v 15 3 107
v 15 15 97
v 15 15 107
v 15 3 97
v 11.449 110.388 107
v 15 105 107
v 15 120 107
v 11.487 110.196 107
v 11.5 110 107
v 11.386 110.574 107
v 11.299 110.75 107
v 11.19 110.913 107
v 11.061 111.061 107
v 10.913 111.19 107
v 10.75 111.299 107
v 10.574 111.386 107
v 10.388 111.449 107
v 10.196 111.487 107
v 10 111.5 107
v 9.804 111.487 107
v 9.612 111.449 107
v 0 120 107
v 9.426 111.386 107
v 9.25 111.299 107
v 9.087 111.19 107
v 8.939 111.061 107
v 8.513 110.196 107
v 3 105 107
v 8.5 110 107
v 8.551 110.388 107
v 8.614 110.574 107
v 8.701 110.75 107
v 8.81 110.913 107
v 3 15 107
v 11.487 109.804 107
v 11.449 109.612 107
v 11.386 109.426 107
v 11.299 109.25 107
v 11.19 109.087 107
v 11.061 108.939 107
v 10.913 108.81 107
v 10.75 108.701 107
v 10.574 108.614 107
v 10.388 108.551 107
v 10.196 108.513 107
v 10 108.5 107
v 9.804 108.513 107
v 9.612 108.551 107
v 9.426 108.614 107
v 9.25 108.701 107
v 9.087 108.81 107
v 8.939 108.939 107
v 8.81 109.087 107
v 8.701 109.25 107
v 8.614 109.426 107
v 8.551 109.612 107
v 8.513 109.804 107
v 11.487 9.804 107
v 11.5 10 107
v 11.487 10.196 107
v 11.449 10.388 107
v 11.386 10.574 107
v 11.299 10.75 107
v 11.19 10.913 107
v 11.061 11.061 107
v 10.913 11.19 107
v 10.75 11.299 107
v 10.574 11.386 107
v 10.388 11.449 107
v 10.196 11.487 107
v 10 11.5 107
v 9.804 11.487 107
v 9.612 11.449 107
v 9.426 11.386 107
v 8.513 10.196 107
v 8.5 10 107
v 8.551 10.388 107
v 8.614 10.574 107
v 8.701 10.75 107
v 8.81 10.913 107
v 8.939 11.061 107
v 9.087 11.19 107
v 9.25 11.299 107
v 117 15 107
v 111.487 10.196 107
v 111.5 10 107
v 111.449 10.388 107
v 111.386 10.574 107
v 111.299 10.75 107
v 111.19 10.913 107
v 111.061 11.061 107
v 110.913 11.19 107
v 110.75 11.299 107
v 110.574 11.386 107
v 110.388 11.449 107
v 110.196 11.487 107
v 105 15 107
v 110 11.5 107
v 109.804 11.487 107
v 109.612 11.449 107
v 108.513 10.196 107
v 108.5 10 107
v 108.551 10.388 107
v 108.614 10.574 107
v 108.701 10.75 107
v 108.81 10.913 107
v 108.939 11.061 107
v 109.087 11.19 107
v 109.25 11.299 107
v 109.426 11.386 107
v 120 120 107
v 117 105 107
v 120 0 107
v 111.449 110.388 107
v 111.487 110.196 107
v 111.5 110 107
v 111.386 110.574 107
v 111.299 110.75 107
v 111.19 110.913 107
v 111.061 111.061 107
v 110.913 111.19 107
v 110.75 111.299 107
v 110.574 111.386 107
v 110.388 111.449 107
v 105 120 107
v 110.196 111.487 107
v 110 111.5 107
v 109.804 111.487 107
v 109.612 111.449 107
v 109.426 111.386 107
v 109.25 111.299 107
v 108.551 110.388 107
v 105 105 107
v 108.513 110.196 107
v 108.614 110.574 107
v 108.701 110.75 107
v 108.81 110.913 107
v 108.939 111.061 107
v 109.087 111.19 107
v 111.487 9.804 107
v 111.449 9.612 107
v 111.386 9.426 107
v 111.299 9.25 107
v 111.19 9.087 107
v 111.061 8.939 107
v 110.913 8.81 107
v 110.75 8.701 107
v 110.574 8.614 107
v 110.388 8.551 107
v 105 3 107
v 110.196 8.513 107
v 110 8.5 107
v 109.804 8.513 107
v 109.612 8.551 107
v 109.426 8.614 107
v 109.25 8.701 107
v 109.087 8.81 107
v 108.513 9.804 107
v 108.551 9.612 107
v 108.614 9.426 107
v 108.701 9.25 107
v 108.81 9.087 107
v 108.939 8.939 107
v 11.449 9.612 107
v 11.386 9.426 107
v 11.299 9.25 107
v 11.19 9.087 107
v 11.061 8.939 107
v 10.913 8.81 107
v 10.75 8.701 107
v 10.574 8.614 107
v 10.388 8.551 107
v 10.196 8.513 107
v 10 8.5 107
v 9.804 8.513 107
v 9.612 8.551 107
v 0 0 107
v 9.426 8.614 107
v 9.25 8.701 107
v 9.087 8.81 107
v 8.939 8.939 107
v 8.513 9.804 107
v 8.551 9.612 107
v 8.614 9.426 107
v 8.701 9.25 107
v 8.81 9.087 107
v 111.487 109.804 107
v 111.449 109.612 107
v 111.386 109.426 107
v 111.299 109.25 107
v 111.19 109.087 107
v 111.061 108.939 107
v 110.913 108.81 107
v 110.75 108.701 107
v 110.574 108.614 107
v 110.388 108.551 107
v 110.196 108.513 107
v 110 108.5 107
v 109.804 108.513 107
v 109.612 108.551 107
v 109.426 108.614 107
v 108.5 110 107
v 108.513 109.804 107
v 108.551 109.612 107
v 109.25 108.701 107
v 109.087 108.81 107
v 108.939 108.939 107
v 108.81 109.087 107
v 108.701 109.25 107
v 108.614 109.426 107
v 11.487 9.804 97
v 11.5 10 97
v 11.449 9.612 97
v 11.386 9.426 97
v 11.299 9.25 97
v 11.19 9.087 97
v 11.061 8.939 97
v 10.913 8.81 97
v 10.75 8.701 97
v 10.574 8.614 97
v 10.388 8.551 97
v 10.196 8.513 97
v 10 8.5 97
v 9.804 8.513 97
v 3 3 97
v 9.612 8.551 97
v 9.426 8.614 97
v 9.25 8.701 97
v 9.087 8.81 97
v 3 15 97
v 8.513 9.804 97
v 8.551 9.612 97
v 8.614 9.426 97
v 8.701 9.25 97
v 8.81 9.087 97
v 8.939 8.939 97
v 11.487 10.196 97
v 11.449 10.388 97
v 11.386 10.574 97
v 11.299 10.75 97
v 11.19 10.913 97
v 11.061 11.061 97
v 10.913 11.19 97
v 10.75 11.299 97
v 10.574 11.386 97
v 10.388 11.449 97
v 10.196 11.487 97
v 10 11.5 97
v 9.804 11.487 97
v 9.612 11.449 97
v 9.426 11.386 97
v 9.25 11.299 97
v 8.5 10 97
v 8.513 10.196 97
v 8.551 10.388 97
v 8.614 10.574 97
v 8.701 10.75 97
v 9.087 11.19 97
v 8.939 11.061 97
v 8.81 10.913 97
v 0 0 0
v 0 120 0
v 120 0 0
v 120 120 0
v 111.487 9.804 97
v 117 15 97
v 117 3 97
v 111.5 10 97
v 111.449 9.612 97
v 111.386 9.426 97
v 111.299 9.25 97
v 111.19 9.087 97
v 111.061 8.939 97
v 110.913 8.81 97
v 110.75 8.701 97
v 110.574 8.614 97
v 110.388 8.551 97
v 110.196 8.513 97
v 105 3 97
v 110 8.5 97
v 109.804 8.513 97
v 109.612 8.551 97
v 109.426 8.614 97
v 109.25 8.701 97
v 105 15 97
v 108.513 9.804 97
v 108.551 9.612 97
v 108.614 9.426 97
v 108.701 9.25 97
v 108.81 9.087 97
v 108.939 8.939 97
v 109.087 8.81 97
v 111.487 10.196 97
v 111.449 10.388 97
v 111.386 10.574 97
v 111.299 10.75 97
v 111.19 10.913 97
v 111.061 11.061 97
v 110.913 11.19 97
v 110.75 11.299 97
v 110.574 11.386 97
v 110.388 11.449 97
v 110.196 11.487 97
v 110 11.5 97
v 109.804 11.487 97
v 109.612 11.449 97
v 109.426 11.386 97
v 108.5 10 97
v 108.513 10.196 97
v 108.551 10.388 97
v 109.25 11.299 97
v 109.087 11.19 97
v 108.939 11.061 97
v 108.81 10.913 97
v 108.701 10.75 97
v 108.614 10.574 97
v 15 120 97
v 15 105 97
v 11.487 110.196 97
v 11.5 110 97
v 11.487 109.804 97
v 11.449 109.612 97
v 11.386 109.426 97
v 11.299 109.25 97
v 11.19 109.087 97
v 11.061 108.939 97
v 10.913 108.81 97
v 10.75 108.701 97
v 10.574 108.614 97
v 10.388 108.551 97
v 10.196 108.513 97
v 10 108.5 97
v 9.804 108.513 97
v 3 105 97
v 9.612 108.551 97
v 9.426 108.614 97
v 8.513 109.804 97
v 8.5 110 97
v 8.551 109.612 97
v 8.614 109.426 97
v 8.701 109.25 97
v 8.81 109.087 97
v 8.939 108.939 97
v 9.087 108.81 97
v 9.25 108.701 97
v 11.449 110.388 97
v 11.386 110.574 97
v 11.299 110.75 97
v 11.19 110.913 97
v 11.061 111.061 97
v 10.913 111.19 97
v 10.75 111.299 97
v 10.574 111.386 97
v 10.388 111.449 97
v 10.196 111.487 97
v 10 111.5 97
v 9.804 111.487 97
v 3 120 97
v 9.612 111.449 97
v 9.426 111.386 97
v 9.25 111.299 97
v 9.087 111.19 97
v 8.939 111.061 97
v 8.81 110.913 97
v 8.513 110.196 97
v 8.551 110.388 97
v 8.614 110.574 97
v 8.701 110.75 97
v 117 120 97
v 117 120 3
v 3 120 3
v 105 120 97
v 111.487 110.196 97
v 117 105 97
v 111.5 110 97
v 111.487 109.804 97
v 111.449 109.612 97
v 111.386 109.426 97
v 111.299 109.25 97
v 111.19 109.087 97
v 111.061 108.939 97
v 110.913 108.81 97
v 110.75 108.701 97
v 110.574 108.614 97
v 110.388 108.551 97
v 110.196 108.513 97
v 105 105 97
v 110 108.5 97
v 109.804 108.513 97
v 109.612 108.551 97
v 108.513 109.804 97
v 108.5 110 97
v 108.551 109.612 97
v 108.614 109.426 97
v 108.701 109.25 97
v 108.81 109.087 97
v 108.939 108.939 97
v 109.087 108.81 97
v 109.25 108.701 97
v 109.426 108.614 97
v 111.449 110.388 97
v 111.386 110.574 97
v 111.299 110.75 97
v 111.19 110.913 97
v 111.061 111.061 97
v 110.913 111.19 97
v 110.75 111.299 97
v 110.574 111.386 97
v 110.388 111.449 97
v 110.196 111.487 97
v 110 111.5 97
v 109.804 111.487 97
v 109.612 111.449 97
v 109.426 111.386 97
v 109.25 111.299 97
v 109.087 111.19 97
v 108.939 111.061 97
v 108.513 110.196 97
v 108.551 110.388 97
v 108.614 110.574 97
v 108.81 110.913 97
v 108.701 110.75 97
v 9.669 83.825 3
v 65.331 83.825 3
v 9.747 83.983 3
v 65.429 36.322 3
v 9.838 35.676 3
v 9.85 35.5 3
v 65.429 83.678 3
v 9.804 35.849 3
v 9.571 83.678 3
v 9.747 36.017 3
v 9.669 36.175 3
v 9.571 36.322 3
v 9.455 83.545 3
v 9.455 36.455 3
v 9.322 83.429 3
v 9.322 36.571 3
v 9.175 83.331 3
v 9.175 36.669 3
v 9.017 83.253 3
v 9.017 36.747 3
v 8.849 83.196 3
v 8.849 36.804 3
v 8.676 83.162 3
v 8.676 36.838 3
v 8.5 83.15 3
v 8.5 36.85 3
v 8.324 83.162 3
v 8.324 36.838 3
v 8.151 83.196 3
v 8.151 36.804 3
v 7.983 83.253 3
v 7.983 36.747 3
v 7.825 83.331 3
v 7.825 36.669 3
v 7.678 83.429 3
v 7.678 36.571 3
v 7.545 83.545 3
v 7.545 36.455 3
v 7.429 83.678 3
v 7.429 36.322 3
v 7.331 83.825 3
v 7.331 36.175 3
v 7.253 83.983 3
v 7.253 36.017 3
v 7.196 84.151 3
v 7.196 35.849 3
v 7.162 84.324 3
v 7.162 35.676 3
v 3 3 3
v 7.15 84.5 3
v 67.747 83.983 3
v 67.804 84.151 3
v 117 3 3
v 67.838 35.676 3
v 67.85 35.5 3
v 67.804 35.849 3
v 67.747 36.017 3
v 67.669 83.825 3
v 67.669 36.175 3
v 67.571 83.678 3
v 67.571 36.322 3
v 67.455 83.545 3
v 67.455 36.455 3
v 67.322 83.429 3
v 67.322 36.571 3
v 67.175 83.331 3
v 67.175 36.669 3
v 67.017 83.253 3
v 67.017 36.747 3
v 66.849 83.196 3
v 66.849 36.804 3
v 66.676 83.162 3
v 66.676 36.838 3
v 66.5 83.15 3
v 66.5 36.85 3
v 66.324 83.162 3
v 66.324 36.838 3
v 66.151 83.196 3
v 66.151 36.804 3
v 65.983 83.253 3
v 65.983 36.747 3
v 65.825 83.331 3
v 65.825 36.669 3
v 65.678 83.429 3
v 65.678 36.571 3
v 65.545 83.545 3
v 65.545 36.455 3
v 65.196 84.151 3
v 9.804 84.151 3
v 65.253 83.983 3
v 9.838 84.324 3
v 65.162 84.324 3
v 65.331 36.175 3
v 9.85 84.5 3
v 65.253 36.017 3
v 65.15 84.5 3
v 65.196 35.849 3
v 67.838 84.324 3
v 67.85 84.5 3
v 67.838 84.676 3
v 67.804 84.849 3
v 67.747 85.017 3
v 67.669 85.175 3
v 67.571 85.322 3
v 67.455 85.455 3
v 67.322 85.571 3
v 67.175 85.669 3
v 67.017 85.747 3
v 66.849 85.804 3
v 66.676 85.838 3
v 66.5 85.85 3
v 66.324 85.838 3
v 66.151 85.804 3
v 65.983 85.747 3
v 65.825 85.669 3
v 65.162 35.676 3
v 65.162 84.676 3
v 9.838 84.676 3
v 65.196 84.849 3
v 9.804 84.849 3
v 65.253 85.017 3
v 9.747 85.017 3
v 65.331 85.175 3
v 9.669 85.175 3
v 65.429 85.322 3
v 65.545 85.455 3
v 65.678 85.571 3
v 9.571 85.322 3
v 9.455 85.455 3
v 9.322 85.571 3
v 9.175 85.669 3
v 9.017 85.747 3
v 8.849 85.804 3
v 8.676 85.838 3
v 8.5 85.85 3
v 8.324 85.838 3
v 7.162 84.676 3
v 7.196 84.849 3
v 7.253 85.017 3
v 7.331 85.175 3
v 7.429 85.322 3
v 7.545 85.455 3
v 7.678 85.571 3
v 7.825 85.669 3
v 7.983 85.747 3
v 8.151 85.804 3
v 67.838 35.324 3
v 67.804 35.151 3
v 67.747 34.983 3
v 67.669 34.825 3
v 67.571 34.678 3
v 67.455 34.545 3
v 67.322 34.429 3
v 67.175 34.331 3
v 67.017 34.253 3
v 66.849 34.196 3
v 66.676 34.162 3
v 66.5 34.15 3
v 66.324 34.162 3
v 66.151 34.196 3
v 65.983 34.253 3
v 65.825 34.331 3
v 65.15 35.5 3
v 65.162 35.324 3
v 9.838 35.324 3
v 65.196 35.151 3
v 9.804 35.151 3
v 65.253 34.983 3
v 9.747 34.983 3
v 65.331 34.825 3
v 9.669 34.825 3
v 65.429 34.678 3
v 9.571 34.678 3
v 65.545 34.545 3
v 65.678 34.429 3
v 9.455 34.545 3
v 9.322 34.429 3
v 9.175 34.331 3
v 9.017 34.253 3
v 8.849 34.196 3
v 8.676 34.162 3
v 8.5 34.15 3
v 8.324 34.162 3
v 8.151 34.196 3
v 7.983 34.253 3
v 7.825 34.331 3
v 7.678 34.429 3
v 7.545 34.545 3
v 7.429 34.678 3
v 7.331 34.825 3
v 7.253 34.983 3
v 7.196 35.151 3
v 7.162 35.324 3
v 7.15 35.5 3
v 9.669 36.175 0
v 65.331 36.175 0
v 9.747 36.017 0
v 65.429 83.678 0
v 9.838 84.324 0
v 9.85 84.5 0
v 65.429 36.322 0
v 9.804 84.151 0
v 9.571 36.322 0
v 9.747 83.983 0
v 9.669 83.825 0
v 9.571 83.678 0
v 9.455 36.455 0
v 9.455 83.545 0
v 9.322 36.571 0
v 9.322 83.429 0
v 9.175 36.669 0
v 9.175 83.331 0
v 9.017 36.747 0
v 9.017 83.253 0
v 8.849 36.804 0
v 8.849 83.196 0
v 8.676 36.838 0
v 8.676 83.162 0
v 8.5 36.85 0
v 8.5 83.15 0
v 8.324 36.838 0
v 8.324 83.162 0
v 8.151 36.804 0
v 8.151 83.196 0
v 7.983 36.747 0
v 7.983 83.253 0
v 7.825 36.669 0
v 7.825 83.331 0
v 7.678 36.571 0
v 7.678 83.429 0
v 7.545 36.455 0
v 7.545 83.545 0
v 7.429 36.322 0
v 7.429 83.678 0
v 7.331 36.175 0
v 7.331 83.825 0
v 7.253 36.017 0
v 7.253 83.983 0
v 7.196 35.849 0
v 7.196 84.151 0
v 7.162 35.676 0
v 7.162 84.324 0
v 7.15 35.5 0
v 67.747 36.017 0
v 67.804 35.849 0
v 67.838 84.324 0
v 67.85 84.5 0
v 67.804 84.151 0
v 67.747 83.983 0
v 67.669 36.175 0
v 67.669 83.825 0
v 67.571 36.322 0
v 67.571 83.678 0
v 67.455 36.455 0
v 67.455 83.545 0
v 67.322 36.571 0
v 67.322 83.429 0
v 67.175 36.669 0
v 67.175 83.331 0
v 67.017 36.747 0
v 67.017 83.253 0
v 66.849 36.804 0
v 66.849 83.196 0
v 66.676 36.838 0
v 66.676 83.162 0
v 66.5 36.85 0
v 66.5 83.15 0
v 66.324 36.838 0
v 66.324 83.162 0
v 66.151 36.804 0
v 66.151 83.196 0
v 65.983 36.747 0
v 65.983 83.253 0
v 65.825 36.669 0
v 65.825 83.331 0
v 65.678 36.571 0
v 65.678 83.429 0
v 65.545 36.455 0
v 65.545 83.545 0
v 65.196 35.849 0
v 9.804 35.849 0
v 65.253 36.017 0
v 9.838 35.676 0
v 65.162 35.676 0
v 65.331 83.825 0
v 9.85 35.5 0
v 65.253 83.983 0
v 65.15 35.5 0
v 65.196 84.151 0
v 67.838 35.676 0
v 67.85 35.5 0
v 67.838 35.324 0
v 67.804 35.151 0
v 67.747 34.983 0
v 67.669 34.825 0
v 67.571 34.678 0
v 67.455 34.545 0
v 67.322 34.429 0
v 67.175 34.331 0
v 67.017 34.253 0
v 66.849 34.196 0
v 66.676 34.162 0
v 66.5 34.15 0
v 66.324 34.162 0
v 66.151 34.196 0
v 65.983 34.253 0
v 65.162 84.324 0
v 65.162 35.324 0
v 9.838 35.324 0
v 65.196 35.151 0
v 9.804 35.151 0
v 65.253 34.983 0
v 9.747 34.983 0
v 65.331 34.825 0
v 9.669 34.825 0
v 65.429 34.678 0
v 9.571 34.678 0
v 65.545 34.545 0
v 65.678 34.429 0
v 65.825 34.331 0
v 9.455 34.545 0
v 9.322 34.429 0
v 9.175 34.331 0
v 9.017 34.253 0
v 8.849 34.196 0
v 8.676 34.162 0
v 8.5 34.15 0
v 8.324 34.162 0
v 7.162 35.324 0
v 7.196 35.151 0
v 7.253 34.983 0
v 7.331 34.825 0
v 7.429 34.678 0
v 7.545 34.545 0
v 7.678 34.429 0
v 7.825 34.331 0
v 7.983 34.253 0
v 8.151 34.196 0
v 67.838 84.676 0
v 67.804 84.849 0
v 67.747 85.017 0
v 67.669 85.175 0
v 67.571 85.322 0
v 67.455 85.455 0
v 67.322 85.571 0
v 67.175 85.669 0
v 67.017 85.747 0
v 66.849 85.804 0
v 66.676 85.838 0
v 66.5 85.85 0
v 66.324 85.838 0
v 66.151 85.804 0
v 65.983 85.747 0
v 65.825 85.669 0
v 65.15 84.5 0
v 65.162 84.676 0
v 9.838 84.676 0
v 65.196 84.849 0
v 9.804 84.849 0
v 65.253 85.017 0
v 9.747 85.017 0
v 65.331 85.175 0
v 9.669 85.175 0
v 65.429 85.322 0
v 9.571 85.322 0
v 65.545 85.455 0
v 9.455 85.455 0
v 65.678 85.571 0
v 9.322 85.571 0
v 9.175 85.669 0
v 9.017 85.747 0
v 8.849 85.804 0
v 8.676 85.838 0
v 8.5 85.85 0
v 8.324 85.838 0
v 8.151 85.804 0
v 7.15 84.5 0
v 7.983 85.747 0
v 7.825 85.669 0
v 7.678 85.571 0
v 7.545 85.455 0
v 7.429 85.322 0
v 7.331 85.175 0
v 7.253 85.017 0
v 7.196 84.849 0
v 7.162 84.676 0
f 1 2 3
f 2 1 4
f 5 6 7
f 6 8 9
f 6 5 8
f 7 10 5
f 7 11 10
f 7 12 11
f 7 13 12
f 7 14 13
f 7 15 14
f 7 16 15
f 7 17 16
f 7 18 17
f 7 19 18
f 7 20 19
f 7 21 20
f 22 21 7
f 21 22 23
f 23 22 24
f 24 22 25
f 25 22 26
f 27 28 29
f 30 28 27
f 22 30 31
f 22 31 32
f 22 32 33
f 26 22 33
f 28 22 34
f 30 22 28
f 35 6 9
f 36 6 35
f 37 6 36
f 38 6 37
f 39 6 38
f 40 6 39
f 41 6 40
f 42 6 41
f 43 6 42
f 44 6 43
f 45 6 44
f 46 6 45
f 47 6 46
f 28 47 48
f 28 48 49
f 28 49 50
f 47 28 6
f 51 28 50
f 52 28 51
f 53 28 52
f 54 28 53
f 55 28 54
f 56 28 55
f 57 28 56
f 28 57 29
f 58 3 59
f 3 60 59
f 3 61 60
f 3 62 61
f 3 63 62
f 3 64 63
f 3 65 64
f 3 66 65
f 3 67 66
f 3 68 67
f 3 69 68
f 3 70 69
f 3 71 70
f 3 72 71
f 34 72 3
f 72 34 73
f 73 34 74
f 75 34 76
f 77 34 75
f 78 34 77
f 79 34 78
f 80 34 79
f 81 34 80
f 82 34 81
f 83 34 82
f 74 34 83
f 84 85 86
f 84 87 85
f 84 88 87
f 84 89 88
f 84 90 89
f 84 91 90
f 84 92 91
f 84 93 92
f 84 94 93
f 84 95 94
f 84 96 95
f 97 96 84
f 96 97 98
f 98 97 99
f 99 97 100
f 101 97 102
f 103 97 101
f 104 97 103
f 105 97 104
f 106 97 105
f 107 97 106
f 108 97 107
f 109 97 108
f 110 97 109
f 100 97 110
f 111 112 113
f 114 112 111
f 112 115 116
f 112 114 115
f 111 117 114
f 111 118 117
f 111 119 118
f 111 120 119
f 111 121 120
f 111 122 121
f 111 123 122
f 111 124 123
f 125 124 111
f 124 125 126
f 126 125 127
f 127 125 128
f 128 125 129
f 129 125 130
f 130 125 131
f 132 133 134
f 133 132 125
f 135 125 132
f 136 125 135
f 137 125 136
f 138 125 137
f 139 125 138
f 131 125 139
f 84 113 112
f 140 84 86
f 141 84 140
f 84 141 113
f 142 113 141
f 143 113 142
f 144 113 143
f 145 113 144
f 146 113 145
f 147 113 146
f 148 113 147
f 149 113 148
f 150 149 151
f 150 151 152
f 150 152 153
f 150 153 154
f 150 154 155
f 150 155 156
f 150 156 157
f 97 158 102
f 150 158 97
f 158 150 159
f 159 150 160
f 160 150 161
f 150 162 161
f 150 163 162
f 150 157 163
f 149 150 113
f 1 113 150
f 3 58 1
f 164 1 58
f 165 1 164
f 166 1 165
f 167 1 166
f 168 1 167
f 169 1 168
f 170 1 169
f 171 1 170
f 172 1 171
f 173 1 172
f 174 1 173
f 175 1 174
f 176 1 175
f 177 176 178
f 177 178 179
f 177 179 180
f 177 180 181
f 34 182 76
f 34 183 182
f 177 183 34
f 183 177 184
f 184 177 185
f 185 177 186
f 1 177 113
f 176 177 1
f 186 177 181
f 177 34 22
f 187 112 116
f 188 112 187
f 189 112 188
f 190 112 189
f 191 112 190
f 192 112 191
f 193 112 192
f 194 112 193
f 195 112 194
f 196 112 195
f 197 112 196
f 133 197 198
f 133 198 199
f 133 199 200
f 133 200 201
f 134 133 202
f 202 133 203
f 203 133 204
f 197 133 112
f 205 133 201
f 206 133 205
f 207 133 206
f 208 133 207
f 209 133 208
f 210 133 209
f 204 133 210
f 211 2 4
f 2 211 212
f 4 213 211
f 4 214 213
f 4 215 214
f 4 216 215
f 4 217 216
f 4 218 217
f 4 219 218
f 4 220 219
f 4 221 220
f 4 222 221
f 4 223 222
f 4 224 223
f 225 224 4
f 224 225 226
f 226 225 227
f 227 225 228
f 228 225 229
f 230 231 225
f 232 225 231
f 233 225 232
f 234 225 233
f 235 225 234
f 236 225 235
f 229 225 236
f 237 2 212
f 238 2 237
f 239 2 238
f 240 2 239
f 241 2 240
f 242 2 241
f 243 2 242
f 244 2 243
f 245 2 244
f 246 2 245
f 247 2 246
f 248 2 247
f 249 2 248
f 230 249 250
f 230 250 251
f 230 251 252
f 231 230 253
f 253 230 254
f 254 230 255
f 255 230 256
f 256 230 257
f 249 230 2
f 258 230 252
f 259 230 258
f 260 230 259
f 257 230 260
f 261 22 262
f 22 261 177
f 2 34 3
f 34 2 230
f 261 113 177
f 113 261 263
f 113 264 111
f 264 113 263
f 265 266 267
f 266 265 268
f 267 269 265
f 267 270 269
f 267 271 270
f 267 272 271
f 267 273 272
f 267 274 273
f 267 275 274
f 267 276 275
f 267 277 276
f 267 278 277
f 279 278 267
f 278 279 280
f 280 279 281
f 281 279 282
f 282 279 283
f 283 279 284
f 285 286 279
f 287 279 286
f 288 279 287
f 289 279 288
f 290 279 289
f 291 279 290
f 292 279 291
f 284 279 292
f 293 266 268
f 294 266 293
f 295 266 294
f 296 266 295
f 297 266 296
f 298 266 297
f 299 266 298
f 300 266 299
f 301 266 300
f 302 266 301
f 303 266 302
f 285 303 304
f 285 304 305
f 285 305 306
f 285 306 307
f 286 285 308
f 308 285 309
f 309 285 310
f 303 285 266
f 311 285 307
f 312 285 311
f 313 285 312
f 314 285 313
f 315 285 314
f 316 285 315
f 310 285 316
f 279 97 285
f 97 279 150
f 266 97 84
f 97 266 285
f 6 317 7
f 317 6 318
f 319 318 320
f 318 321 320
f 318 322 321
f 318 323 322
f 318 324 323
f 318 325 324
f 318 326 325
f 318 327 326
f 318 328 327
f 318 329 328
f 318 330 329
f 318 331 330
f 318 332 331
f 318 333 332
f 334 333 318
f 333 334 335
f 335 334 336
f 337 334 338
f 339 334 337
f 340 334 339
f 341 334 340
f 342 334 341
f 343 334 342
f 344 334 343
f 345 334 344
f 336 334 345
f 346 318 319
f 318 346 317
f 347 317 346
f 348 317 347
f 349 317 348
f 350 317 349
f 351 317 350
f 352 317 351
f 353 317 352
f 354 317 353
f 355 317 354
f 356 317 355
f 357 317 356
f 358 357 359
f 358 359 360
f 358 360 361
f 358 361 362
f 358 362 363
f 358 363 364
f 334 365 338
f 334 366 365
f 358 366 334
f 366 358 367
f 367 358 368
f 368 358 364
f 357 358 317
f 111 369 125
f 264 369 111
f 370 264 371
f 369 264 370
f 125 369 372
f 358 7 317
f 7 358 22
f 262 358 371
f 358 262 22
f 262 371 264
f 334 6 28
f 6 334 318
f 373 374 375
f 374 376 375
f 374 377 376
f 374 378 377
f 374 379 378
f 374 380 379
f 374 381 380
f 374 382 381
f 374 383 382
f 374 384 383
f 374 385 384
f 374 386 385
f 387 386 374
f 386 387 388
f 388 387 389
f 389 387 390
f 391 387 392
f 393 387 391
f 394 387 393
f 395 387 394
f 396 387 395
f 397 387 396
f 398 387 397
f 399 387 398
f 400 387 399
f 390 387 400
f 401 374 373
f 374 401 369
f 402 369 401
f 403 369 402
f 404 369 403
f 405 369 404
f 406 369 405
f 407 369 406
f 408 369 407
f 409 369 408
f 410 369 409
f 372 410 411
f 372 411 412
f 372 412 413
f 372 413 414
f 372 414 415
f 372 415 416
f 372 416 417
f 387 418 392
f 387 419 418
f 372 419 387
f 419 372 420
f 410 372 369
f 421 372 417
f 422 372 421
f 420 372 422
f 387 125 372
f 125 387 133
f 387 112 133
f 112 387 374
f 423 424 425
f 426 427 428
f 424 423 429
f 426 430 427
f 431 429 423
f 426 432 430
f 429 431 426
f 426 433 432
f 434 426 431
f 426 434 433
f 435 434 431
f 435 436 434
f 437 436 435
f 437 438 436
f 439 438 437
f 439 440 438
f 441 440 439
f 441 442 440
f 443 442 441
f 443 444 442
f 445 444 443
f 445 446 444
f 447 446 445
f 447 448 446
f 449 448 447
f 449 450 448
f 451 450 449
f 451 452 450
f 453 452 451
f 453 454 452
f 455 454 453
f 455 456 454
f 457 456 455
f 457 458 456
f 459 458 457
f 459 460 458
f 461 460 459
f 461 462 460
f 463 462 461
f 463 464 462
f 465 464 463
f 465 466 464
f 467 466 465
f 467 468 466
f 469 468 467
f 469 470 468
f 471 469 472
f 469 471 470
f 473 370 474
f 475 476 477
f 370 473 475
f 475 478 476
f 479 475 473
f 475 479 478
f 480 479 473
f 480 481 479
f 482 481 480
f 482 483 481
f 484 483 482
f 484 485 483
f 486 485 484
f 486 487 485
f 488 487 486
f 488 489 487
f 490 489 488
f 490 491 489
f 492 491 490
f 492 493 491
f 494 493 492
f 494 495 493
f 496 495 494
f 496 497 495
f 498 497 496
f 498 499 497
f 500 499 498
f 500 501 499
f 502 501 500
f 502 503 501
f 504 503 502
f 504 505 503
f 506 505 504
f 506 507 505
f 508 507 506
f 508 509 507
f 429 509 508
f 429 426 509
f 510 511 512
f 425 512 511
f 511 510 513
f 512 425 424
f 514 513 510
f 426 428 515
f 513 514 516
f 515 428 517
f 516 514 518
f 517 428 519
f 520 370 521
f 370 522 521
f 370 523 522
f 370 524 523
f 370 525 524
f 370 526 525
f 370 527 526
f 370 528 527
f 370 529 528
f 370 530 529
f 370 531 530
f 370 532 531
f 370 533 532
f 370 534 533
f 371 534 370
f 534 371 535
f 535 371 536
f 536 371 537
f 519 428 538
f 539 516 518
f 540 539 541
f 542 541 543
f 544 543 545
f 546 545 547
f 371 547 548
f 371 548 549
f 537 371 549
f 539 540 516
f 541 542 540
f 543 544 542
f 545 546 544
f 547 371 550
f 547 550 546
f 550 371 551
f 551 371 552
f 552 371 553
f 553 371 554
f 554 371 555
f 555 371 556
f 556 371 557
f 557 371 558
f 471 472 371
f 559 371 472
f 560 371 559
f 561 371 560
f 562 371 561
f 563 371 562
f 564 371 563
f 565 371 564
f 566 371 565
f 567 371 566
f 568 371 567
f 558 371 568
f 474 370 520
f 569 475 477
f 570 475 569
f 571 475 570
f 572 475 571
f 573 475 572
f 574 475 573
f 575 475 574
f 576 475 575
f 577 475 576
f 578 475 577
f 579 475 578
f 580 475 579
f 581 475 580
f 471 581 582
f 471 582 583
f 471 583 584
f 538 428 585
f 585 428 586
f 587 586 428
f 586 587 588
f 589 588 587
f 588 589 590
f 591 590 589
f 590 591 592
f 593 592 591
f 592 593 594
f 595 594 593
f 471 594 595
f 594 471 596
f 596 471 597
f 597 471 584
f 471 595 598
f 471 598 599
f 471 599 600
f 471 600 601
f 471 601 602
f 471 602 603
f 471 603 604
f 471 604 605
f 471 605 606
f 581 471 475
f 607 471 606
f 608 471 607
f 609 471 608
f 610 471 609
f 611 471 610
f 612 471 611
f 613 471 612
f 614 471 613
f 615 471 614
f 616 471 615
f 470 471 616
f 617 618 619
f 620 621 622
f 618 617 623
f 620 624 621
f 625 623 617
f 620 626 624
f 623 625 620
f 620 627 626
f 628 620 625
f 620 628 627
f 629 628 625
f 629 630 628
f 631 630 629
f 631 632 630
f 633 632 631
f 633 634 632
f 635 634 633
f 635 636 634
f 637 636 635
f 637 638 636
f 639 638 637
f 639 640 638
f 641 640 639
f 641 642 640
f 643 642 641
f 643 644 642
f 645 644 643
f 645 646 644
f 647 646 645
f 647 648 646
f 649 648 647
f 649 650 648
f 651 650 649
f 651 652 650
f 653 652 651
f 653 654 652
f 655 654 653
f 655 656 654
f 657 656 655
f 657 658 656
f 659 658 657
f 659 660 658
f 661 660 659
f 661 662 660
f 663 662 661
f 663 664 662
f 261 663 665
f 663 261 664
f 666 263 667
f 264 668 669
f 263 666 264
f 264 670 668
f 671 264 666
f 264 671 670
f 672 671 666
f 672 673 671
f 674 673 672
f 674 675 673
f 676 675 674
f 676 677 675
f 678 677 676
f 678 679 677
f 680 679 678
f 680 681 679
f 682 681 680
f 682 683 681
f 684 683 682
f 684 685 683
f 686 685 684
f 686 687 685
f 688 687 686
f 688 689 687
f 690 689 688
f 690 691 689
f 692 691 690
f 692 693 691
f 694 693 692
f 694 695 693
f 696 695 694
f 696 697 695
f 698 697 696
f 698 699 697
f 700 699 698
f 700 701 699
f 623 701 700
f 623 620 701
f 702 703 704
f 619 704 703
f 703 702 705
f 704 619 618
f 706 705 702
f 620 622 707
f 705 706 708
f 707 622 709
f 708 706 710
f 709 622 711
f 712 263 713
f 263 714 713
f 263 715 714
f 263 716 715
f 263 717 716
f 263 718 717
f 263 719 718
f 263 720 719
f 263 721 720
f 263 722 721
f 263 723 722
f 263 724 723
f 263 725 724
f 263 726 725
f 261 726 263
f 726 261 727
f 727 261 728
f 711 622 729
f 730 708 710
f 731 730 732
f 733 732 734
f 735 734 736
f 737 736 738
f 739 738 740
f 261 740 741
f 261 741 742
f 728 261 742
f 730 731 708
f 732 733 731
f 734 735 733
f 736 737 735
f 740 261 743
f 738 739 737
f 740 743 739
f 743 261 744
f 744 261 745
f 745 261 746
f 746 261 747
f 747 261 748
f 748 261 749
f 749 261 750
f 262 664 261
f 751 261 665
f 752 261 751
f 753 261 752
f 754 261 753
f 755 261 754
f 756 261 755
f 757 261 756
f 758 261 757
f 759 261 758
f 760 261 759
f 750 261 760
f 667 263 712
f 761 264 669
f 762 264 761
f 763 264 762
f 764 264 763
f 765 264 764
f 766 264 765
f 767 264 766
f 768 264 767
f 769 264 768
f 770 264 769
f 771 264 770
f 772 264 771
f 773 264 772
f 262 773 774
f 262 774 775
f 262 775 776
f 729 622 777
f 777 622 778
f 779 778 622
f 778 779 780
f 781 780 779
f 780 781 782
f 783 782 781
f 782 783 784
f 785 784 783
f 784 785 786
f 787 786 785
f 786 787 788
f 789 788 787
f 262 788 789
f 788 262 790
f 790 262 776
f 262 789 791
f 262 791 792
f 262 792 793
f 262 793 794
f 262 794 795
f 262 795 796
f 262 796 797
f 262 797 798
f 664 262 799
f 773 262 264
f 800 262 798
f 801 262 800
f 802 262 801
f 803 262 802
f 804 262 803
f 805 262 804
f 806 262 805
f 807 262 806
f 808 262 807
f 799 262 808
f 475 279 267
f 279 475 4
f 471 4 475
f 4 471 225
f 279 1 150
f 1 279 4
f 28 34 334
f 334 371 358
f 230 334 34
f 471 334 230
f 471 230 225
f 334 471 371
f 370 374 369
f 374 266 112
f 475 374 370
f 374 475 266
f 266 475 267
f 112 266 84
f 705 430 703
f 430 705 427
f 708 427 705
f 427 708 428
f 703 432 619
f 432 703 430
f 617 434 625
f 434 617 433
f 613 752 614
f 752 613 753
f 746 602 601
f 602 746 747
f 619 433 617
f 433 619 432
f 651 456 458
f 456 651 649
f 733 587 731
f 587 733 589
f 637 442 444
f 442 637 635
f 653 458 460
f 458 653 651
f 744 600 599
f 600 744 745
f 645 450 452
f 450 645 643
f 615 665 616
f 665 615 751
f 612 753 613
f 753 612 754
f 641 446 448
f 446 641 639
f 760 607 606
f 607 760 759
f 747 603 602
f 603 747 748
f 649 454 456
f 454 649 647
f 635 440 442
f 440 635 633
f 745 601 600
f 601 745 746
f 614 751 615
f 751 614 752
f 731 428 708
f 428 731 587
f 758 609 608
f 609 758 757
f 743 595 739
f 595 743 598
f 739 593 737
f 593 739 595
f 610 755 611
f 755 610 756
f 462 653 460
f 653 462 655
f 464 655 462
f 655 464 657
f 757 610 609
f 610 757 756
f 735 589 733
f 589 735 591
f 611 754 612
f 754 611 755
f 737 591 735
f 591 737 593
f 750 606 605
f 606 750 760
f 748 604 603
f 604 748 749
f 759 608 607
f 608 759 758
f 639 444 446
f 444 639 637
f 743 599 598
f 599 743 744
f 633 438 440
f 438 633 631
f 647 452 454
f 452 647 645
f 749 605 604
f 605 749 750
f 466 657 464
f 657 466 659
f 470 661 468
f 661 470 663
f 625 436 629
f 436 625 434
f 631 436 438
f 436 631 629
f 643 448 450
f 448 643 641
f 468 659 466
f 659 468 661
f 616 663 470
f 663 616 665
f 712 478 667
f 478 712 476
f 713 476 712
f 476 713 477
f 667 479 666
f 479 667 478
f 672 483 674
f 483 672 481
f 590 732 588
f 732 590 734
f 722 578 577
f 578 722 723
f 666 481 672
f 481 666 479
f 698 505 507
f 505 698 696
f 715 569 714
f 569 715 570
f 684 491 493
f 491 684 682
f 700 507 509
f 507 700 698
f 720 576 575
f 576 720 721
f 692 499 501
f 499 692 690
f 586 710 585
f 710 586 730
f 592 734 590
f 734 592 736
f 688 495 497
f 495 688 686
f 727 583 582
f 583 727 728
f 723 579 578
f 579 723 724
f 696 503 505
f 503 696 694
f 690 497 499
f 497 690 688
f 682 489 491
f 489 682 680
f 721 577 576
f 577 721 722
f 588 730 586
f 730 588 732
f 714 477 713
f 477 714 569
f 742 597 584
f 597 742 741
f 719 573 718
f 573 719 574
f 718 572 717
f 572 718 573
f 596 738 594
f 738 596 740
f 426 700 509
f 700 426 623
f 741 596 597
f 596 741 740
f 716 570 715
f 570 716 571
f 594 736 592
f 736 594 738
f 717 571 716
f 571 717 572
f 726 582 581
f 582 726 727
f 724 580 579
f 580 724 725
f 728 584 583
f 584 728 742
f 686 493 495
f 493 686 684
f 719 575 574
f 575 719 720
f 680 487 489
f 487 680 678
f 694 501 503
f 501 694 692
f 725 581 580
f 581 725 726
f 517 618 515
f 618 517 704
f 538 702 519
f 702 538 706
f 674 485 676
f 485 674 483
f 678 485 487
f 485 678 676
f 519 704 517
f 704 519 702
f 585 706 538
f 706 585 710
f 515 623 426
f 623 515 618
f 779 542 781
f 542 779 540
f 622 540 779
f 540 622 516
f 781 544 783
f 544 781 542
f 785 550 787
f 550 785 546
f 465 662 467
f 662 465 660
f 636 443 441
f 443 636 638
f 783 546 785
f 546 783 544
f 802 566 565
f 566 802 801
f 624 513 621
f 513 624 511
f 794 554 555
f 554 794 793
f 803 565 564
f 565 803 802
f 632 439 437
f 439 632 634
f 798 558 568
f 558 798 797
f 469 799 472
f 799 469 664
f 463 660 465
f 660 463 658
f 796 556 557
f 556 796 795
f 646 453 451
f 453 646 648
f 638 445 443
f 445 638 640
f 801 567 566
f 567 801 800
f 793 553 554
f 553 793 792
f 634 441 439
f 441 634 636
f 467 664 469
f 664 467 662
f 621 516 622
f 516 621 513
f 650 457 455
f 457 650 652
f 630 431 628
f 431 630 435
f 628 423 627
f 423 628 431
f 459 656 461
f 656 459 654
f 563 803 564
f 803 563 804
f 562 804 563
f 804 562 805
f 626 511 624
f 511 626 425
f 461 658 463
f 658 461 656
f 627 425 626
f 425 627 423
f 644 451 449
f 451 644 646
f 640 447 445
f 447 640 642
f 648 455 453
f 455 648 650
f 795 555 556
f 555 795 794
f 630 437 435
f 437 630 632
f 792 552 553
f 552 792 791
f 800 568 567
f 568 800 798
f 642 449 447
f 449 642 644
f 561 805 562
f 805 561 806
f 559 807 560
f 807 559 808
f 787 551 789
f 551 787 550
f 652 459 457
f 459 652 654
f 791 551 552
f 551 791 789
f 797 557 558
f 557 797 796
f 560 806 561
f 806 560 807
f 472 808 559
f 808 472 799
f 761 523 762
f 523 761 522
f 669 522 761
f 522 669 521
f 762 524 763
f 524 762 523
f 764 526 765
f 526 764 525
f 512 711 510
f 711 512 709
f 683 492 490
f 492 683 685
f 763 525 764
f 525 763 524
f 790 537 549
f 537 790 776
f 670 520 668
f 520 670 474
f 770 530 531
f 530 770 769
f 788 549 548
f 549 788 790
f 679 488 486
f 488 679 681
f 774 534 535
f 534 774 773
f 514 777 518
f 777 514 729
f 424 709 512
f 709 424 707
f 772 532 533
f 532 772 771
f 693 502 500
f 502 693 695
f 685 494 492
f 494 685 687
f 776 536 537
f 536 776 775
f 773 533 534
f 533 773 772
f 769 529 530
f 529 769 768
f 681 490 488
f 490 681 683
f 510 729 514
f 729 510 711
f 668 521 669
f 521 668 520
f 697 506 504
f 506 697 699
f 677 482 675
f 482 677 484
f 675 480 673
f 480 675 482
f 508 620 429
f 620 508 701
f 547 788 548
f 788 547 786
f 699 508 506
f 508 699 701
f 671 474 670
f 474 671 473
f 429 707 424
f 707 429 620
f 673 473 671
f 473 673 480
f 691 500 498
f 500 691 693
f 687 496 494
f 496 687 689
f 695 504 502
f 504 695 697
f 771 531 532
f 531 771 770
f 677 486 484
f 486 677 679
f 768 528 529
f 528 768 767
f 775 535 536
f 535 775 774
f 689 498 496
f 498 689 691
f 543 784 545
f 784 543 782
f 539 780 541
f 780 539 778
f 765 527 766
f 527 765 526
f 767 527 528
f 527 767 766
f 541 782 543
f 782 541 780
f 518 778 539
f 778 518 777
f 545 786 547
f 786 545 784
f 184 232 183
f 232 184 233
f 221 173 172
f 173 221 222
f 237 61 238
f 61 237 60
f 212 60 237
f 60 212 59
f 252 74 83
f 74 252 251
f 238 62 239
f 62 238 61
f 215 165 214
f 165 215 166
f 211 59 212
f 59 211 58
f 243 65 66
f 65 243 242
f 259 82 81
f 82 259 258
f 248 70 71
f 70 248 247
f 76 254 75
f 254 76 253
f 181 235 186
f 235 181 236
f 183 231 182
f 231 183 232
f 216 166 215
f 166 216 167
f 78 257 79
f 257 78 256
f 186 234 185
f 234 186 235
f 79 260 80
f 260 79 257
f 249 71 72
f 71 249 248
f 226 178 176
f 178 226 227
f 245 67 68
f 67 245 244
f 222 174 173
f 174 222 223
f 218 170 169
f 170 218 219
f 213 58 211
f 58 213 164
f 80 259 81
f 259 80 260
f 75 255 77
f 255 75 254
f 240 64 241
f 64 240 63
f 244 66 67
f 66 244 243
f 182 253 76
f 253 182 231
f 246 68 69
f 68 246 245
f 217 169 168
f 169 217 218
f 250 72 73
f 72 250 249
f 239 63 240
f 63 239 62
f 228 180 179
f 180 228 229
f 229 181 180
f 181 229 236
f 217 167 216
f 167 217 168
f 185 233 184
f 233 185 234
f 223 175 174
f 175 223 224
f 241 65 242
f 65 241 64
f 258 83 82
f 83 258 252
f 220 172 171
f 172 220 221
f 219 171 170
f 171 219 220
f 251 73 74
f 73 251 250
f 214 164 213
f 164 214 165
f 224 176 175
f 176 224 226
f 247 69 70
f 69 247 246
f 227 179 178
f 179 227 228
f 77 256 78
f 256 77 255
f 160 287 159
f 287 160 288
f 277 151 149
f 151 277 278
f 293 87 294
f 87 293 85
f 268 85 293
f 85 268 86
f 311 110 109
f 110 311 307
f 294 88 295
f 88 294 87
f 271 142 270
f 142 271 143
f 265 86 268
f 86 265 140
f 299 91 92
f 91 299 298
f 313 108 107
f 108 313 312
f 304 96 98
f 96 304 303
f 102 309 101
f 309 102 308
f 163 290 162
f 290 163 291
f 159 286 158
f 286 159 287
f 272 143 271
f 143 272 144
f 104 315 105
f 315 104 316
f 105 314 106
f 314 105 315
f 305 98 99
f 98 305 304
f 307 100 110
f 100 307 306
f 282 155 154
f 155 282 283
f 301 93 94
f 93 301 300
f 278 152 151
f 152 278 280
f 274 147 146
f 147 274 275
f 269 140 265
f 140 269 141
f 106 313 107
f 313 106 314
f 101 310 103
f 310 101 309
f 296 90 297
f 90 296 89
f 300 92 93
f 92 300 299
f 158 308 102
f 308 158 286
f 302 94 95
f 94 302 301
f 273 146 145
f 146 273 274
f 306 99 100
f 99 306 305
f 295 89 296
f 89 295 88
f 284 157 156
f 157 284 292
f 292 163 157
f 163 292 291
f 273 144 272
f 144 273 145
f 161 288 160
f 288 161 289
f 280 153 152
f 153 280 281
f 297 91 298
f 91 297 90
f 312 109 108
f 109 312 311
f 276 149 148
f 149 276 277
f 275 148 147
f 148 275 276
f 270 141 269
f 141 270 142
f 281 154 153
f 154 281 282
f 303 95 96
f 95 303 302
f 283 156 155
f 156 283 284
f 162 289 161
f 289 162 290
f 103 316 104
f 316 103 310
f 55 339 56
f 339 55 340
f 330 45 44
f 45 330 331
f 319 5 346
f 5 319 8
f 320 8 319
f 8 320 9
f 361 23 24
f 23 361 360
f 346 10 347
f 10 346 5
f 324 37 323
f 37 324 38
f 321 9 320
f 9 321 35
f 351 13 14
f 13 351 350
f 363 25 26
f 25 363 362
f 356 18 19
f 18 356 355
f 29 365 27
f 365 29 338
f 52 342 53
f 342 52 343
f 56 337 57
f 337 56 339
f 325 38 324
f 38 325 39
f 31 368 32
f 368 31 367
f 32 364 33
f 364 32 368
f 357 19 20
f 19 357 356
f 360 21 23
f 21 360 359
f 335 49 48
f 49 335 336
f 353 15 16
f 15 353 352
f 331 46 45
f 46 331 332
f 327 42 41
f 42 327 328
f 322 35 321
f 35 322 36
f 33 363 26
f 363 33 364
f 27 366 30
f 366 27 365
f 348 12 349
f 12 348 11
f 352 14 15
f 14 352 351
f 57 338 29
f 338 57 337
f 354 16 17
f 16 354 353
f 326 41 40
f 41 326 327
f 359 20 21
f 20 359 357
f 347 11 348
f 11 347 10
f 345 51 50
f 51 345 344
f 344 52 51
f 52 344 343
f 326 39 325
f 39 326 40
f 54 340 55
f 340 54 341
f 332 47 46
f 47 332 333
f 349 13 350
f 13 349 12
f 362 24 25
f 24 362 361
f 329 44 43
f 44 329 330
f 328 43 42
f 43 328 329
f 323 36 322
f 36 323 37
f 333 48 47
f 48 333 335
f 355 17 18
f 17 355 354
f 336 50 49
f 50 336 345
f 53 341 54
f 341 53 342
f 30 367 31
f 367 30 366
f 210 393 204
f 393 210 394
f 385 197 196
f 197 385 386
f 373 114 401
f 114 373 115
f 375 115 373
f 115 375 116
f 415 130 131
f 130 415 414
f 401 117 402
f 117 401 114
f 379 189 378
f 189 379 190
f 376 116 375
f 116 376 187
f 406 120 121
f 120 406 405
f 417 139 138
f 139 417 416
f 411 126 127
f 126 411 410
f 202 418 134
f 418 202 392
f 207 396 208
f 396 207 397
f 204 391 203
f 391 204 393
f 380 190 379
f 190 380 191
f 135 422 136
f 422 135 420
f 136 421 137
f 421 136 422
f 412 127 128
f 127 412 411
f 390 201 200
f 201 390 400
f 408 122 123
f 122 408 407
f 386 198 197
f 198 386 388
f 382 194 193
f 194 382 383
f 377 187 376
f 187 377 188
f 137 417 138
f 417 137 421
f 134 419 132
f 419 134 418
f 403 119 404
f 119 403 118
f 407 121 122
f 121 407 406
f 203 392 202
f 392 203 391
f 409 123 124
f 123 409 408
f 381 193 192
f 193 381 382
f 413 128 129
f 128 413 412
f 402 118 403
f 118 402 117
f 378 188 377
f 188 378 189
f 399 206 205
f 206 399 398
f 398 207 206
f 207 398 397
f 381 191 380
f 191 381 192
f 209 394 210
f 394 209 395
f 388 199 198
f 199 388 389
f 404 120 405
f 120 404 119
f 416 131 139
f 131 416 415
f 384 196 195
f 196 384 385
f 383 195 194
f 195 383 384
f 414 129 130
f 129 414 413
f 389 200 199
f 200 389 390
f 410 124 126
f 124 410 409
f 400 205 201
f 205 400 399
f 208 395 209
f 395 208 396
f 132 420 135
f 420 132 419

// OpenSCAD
// file: parts/assembly_review.scad
// ---------------------------------------------------------------------------
// assembly_review.scad - raspberrypi5_case product-assembly review scene.
//
// Review geometry ONLY. Part id 90 (review_dispatch_id in assembly.json)
// dispatches to this scene; it is NEVER exported as a printable part —
// the manifest exports base (part 1) and lid (part 2) only.
//
// Both parts are modeled directly in assembly coordinates, so the contract's
// identity transforms (assembly.json, case_joint) apply trivially: the
// product assembly is base() union lid() with no extra transforms. The
// front and isometric views in assembly.json render from this single scene
// (the view cameras are applied by the build tool).
// ---------------------------------------------------------------------------

module assembly_review(view_id = 0, show_proxies = true) {
    assert(view_id == 0 && show_proxies,
        str("assembly_review: unsupported options view_id=", view_id,
            " show_proxies=", show_proxies));
    // base() occupies z 0..107; lid() occupies z 107..125.
    union() {
        base();
        lid();
    }
}
// main file
// main.scad — raspberrypi5_case part dispatch.
// Part ids (parts.json): 1 = base, 2 = lid; 90 = assembly review scene
// (review_dispatch_id in assembly.json; not a printable part).
// Config-driven per-part entries are injected by scripts/scad_build_all.py
// (part_id + part params), so this file hardcodes no config values.

include <lib/defaults.scad>;
include <parts/base.scad>;
include <parts/lid.scad>;
include <parts/assembly_review.scad>;

review_dispatch_id = 90;

_part_id = is_undef(part_id) ? 1 : part_id;

if (_part_id == 1) {
    // Part 1: case base (floor + front/left/right walls + M3 rim blocks).
    base();
} else if (_part_id == 2) {
    // Part 2: case lid (slab + rim band + camera emblem + M3 clearance blocks).
    lid();
} else if (_part_id == review_dispatch_id) {
    // Product-assembly review scene (front + isometric per assembly.json).
    assembly_review(0, true);
} else {
    assert(false, str("Unknown part_id: ", _part_id));
}
